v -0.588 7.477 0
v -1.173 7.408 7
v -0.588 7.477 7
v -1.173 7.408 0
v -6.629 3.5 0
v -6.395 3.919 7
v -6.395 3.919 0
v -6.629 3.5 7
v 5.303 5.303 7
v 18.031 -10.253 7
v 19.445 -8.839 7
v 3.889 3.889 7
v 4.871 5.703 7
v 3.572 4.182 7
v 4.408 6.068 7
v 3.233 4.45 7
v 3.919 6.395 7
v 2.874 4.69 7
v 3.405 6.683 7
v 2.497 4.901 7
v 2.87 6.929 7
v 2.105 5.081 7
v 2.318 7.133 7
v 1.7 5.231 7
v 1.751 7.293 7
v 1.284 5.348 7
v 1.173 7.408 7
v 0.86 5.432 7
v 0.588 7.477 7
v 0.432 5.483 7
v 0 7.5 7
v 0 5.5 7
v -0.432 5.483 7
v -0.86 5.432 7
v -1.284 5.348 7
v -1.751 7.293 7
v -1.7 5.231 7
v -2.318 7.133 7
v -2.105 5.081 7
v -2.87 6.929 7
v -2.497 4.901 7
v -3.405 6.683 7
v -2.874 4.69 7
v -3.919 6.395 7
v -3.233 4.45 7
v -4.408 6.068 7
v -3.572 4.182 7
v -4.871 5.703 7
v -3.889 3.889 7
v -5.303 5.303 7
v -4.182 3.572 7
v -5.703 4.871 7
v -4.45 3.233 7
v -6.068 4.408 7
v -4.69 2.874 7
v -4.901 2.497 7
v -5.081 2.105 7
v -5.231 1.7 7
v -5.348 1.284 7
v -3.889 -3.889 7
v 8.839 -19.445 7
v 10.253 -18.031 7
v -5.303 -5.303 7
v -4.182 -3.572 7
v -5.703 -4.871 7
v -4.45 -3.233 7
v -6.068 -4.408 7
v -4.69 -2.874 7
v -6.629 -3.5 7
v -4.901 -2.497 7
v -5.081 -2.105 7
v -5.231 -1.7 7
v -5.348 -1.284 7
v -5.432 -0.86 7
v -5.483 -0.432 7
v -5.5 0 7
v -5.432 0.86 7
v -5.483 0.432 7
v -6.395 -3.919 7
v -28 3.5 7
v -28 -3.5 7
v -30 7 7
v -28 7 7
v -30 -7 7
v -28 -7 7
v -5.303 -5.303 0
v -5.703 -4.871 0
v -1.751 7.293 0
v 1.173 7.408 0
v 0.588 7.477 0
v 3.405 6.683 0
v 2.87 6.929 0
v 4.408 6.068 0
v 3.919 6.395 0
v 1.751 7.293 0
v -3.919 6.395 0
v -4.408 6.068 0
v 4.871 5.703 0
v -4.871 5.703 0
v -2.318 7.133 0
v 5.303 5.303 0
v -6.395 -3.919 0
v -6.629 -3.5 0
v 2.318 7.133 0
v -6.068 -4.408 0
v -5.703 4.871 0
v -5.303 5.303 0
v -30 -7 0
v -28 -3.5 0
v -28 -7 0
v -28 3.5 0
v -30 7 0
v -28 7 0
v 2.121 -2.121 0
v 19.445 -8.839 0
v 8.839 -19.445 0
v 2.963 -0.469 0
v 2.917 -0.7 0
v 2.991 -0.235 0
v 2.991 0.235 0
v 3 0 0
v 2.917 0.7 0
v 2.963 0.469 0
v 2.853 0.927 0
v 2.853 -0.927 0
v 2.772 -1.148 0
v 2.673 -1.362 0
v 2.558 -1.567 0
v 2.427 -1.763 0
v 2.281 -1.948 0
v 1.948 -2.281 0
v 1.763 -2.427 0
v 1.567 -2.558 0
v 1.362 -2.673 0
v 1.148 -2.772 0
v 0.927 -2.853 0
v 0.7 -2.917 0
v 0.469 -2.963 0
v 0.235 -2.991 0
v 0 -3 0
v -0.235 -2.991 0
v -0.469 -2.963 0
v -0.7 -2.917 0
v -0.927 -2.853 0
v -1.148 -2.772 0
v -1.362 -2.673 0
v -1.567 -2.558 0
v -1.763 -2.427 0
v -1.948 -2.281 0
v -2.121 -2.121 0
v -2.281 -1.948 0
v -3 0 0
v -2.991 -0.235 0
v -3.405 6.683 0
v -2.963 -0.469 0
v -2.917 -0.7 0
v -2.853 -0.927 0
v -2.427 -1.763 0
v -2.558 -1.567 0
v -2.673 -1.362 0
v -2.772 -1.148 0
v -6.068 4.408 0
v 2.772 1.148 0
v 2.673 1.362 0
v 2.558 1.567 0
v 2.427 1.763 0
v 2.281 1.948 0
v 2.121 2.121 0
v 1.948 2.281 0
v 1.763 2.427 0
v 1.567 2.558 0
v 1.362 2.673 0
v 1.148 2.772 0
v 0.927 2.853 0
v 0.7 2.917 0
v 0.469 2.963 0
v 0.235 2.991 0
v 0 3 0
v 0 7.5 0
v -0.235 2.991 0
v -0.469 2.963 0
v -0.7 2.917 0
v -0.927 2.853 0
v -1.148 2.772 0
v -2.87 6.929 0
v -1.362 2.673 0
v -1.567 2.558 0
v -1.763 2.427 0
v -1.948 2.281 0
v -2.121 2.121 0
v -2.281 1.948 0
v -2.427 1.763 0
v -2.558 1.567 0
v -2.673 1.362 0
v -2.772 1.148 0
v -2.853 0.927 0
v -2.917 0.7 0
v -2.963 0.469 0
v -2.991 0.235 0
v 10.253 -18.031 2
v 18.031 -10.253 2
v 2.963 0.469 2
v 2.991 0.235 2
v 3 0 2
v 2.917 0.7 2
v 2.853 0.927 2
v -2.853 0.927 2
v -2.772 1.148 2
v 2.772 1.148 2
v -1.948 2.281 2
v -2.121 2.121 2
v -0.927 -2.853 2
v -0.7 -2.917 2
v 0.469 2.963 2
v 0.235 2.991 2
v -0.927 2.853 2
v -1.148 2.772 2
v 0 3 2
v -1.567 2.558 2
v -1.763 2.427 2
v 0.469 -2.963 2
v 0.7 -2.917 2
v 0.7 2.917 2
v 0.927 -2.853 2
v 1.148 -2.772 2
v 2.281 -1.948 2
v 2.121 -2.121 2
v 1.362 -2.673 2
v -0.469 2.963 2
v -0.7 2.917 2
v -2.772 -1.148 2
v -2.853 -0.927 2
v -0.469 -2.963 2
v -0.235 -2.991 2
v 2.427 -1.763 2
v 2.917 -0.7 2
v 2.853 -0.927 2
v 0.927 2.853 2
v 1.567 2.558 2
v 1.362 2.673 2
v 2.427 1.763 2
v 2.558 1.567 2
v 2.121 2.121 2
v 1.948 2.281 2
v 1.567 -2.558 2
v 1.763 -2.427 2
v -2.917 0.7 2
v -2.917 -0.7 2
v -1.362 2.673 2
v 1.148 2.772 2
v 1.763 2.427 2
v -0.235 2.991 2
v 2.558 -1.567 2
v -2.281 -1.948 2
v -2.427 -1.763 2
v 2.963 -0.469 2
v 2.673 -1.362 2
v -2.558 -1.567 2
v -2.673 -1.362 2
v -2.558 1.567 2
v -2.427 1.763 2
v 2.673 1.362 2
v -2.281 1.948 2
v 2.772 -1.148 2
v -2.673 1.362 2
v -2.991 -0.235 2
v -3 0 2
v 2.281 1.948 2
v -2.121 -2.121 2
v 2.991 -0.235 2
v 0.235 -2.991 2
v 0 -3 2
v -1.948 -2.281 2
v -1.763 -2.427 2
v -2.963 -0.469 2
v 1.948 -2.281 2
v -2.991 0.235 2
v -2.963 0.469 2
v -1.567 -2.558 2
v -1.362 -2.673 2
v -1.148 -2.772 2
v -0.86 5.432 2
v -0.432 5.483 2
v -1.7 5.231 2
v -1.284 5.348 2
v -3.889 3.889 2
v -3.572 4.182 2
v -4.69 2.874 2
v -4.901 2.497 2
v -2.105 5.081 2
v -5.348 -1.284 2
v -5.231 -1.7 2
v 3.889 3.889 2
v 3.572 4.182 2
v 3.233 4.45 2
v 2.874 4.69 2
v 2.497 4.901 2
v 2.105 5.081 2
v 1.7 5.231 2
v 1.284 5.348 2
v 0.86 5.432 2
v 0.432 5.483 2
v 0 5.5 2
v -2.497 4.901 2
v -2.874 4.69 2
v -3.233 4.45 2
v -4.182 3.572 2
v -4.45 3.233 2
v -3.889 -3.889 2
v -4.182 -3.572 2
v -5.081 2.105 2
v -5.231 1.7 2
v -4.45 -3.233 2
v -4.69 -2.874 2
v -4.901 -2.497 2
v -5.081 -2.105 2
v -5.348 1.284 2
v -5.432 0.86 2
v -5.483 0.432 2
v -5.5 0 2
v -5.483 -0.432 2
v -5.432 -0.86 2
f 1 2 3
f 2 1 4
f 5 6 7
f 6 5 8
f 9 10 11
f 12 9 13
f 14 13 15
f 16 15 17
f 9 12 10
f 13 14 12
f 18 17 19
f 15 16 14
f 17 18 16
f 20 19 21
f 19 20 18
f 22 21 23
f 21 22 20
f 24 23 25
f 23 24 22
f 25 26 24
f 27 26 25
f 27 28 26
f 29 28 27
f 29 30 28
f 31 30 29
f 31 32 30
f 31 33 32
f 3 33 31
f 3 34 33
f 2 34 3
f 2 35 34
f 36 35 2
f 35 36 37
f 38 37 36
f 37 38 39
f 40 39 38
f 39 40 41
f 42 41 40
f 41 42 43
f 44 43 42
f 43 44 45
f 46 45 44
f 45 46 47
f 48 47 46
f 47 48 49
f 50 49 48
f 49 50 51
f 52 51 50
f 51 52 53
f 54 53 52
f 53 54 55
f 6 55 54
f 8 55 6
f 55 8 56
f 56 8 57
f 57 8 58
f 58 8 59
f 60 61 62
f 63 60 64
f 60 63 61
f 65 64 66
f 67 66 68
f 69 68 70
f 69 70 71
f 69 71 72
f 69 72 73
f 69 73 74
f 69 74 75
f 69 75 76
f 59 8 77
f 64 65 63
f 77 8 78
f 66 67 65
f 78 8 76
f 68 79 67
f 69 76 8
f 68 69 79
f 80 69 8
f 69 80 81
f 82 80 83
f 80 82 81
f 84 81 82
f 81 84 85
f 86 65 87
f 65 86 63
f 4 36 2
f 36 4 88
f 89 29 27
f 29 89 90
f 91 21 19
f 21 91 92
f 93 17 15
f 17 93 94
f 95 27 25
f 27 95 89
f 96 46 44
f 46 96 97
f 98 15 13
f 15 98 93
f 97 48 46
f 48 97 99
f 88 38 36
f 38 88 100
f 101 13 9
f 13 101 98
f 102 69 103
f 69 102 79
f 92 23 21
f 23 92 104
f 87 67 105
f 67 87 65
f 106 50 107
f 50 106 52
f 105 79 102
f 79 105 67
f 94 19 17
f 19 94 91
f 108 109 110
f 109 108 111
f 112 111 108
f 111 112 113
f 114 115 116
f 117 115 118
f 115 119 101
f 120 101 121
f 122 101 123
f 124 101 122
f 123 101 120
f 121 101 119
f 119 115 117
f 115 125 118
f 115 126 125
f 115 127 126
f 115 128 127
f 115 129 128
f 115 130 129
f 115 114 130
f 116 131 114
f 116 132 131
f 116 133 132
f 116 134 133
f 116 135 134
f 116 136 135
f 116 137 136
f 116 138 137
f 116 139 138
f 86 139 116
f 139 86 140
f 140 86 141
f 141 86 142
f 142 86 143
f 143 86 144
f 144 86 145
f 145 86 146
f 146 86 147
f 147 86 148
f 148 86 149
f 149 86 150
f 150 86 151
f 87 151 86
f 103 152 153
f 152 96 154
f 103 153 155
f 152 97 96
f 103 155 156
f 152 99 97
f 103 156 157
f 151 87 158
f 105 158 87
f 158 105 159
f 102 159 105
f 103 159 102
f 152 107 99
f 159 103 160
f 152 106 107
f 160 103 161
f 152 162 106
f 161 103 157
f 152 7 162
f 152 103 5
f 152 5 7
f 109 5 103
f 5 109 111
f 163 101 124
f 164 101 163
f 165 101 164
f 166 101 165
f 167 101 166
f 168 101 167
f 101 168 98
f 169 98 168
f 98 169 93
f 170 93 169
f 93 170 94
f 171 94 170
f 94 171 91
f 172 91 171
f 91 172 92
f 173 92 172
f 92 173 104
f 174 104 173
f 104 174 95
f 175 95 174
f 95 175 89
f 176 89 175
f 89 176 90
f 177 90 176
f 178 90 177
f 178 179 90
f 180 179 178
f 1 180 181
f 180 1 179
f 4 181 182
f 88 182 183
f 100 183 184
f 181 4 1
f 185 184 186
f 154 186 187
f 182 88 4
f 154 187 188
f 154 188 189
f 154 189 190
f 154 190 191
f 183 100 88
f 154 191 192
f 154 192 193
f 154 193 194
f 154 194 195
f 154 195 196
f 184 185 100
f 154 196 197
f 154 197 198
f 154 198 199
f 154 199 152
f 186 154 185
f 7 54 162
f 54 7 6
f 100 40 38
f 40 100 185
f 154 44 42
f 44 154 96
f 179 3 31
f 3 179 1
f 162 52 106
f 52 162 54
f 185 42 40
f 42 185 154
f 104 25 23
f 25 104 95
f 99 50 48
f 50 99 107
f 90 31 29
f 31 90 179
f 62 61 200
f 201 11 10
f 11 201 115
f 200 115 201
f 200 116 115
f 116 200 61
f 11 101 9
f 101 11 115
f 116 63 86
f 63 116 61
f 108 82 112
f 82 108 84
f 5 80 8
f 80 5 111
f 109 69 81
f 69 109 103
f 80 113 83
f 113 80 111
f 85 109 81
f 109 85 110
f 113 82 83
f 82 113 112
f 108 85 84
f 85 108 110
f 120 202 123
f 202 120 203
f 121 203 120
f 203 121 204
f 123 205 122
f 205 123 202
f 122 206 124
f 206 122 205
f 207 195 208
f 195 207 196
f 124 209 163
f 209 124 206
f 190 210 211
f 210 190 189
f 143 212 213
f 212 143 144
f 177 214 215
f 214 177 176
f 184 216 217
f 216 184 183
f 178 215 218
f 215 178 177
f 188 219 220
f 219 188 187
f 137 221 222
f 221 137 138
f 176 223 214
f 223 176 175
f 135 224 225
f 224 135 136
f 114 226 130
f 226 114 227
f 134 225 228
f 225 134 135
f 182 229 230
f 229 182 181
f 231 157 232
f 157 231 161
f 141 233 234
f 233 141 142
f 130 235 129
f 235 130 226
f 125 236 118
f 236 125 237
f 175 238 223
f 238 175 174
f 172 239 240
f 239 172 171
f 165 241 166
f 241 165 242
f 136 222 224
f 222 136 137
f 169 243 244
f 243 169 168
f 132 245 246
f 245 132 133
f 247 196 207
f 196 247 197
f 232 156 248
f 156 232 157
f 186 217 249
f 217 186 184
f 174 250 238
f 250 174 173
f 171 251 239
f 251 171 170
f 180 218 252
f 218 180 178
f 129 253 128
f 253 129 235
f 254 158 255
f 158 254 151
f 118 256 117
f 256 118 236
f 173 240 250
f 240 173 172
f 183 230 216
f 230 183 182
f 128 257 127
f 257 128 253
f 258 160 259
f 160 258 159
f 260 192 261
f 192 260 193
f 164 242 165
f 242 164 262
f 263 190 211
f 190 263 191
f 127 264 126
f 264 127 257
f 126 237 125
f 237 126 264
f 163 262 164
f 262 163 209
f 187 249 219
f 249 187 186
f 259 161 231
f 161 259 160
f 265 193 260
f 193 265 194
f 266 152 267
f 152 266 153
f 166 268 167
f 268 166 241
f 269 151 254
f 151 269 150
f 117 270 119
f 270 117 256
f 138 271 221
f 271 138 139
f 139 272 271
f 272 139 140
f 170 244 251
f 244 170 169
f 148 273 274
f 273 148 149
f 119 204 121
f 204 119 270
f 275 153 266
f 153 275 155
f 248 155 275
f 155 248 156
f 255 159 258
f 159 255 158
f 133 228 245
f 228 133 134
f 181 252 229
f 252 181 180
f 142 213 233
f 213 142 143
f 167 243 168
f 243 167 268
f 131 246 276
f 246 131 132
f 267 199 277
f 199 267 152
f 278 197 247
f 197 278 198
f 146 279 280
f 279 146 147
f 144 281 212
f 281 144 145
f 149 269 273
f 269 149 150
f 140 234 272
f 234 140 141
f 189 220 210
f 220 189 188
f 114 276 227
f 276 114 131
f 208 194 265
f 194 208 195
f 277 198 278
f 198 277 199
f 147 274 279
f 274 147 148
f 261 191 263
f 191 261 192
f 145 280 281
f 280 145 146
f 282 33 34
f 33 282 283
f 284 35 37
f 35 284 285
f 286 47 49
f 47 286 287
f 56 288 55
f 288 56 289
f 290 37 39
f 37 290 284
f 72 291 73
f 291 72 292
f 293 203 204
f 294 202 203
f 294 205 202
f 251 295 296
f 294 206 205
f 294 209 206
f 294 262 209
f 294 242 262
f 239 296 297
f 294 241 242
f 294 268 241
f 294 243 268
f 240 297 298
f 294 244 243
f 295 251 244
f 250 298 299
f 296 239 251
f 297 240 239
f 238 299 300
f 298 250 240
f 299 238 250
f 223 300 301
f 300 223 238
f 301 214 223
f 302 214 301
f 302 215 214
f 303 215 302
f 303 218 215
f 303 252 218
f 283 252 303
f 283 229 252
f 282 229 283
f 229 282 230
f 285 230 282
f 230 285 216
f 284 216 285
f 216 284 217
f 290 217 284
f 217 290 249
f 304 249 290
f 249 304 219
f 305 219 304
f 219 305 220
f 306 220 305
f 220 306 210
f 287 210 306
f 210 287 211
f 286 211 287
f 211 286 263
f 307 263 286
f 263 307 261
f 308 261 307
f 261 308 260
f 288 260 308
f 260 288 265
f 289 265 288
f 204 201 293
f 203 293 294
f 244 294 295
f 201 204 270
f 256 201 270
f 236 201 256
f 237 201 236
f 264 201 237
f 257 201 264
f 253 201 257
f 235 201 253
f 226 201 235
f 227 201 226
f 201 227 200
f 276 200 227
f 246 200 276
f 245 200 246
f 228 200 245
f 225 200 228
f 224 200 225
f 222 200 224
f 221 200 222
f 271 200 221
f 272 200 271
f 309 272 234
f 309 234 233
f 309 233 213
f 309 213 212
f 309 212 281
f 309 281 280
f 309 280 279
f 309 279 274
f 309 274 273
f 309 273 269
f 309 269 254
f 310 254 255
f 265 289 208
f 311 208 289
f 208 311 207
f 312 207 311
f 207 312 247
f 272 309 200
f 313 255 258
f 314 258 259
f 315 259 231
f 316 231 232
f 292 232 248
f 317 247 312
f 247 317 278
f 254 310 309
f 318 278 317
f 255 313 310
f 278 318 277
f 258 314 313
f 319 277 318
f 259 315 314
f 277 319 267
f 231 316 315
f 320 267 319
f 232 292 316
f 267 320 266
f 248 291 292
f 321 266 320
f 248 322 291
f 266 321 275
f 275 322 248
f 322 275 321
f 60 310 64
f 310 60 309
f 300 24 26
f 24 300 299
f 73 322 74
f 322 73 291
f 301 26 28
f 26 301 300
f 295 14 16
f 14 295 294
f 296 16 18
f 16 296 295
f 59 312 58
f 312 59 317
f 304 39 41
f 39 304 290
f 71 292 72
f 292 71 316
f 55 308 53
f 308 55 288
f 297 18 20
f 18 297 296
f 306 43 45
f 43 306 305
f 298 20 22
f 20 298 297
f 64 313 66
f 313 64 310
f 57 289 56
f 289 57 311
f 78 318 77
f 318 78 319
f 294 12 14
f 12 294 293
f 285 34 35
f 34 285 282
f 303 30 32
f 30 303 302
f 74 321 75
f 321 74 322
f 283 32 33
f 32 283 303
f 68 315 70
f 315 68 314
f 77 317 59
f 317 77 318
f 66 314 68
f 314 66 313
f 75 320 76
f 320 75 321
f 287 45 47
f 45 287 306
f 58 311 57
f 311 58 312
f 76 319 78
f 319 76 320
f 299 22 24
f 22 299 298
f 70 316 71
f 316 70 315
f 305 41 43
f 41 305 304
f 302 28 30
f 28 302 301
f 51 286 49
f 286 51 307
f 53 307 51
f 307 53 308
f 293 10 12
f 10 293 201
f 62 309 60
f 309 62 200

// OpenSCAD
dia = 6;
wall = 2;
thickness = 7;
arm_width = 11;
arm_length = 20;
t_length = 30;

$fn=80;

module cable_clip()
{
  difference() {
    y=wall+arm_width+wall;
    union() {
      cylinder(r=y/2, h=thickness);
      
      rotate([0, 0, -45])
        translate([0, -y/2, 0])
        cube([arm_length, y, thickness]);
      
      translate([-t_length, -thickness/2, 0])
        cube([t_length, thickness, thickness]);
      
      translate([-t_length, -thickness, 0])
        cube([wall, thickness*2, thickness]);
    }
    union() {
      translate([0, 0, -1])
        cylinder(r=(dia/2), h=thickness+2);
      
      translate([0, 0, wall])
        cylinder(r=arm_width/2, h=thickness);
      
      rotate([0, 0, -45])
        translate([0, -arm_width/2, wall])
        cube([arm_length+1, arm_width, thickness]);
    }
  }
}

cable_clip();
